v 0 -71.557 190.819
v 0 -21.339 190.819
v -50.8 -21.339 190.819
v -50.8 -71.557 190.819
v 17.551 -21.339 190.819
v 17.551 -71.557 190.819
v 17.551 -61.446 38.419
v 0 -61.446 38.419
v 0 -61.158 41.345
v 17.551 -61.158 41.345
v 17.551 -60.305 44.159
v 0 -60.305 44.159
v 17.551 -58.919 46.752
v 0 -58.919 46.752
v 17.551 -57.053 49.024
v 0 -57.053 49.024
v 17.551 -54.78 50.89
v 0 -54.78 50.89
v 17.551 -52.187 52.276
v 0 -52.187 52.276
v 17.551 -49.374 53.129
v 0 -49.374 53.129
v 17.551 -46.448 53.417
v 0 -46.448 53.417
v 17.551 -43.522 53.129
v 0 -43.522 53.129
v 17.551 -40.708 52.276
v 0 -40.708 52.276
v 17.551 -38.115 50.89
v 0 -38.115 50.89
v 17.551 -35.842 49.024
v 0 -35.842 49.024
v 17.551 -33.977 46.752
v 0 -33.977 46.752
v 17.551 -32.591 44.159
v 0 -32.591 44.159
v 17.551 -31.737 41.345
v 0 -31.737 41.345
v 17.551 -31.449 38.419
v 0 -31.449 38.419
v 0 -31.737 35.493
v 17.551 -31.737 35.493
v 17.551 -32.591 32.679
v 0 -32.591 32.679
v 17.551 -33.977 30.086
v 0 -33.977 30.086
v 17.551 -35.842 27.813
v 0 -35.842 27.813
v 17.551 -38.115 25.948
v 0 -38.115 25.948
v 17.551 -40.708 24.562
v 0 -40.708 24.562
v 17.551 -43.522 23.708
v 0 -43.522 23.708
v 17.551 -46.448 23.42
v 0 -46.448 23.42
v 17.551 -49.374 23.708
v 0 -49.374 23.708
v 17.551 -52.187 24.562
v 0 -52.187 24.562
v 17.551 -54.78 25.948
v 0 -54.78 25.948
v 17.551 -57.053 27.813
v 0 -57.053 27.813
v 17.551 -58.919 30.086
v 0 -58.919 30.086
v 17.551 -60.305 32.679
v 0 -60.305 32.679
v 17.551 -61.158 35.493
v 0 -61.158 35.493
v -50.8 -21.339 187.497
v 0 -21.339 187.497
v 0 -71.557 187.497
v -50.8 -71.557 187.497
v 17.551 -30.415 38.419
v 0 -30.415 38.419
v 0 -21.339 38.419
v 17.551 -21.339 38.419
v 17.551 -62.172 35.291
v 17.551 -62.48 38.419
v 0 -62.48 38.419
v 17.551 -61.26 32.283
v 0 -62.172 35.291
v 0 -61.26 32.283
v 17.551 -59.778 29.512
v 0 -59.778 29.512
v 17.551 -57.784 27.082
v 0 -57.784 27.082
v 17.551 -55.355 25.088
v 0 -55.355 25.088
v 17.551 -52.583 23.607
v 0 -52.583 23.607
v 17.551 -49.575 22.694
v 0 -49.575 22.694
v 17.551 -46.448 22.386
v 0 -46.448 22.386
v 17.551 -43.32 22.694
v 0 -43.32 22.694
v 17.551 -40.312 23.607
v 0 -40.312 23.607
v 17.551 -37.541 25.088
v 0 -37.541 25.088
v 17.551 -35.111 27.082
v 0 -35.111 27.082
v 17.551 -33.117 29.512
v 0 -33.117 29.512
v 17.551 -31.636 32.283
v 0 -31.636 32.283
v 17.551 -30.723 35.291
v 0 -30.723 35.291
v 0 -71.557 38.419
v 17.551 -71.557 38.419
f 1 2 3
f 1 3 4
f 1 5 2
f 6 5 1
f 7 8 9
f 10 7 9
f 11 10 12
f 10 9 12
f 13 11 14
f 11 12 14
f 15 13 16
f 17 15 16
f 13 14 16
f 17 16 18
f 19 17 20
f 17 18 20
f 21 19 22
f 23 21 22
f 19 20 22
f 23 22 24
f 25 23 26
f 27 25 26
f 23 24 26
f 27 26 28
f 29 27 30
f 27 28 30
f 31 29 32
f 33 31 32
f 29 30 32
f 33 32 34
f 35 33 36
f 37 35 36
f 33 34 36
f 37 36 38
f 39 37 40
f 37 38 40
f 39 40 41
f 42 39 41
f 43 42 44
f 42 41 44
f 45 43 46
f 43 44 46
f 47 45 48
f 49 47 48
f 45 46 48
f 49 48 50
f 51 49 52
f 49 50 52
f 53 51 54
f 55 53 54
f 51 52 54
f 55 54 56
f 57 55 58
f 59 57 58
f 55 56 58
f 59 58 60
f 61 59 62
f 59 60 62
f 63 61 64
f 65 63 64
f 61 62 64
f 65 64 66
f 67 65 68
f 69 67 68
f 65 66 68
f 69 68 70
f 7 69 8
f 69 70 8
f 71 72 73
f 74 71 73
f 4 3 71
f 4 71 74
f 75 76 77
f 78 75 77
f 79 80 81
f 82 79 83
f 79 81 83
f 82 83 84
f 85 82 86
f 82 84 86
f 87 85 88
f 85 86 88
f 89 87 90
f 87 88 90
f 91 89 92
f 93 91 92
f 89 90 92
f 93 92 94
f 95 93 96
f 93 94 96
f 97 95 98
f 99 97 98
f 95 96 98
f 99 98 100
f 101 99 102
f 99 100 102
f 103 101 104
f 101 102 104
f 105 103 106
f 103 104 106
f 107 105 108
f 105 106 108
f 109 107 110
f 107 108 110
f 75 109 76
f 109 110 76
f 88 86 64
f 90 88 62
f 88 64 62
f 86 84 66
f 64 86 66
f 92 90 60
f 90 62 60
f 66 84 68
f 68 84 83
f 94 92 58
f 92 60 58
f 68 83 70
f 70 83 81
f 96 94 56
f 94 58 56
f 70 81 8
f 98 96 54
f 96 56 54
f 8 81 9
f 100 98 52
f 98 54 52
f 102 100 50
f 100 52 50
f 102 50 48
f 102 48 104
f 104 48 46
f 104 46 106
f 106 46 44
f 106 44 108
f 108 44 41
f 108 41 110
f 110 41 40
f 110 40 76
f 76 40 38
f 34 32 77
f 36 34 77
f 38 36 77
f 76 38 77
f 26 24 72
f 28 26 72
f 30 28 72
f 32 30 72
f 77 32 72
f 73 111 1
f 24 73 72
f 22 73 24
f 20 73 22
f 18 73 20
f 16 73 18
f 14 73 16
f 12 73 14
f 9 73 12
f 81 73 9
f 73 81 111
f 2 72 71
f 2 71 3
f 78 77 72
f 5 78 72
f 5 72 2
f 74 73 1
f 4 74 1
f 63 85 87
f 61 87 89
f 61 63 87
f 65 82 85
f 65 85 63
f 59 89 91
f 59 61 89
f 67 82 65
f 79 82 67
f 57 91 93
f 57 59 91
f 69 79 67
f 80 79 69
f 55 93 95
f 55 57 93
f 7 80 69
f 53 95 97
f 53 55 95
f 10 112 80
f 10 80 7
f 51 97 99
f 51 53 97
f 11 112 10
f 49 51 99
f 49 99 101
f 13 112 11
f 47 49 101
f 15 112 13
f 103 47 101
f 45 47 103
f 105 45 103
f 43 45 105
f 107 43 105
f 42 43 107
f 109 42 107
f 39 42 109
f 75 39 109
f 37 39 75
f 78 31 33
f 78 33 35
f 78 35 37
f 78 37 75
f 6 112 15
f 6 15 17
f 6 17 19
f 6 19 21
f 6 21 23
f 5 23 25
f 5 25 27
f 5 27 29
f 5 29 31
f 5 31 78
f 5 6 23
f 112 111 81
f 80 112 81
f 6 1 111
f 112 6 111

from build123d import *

# Parameters (mm, degrees)
F1_DEPTH = 17.5514
F2_W     = 50.218091
F2_H     = 3.322014
F3_DEPTH = 50.8


with BuildPart() as f1:
    # F0 (on Right) → F1 (new body)
    with BuildSketch(Plane.YZ):
        with BuildLine():
            ThreePointArc((-62.479986, 38.418766), (-46.447612, 54.45114), (-30.415238, 38.418766))
            Line((-30.415238, 38.418766), (-21.338567, 38.418766))
            Line((-21.338567, 38.418766), (-21.338567, 190.818766))
            Line((-21.338567, 190.818766), (-71.556658, 190.818766))
            Line((-71.556658, 190.818766), (-71.556658, 38.418766))
            Line((-71.556658, 38.418766), (-62.479986, 38.418766))
        make_face()
        with BuildLine():
            Line((-30.415238, 38.418766), (-31.4489, 38.418766))
            ThreePointArc((-31.4489, 38.418766), (-46.447612, 23.420053), (-61.446325, 38.418766))
            Line((-61.446325, 38.418766), (-62.479986, 38.418766))
            ThreePointArc((-62.479986, 38.418766), (-46.447612, 22.386392), (-30.415238, 38.418766))
        make_face()
        with BuildLine():
            ThreePointArc((-61.446325, 38.418766), (-46.447612, 53.417479), (-31.4489, 38.418766))
            Line((-31.4489, 38.418766), (-30.415238, 38.418766))
            ThreePointArc((-30.415238, 38.418766), (-46.447612, 54.45114), (-62.479986, 38.418766))
            Line((-62.479986, 38.418766), (-61.446325, 38.418766))
        make_face()
    extrude(amount=F1_DEPTH)

    # F2 (on face) → F3 (join)
    with BuildSketch(Plane(origin=(0, 0, 0), x_dir=(0, -1, 0), z_dir=(-1, 0, 0))):
        with Locations((46.447612, 189.157759)):
            Rectangle(F2_W, F2_H)
    extrude(amount=F3_DEPTH)


solid = f1.part
